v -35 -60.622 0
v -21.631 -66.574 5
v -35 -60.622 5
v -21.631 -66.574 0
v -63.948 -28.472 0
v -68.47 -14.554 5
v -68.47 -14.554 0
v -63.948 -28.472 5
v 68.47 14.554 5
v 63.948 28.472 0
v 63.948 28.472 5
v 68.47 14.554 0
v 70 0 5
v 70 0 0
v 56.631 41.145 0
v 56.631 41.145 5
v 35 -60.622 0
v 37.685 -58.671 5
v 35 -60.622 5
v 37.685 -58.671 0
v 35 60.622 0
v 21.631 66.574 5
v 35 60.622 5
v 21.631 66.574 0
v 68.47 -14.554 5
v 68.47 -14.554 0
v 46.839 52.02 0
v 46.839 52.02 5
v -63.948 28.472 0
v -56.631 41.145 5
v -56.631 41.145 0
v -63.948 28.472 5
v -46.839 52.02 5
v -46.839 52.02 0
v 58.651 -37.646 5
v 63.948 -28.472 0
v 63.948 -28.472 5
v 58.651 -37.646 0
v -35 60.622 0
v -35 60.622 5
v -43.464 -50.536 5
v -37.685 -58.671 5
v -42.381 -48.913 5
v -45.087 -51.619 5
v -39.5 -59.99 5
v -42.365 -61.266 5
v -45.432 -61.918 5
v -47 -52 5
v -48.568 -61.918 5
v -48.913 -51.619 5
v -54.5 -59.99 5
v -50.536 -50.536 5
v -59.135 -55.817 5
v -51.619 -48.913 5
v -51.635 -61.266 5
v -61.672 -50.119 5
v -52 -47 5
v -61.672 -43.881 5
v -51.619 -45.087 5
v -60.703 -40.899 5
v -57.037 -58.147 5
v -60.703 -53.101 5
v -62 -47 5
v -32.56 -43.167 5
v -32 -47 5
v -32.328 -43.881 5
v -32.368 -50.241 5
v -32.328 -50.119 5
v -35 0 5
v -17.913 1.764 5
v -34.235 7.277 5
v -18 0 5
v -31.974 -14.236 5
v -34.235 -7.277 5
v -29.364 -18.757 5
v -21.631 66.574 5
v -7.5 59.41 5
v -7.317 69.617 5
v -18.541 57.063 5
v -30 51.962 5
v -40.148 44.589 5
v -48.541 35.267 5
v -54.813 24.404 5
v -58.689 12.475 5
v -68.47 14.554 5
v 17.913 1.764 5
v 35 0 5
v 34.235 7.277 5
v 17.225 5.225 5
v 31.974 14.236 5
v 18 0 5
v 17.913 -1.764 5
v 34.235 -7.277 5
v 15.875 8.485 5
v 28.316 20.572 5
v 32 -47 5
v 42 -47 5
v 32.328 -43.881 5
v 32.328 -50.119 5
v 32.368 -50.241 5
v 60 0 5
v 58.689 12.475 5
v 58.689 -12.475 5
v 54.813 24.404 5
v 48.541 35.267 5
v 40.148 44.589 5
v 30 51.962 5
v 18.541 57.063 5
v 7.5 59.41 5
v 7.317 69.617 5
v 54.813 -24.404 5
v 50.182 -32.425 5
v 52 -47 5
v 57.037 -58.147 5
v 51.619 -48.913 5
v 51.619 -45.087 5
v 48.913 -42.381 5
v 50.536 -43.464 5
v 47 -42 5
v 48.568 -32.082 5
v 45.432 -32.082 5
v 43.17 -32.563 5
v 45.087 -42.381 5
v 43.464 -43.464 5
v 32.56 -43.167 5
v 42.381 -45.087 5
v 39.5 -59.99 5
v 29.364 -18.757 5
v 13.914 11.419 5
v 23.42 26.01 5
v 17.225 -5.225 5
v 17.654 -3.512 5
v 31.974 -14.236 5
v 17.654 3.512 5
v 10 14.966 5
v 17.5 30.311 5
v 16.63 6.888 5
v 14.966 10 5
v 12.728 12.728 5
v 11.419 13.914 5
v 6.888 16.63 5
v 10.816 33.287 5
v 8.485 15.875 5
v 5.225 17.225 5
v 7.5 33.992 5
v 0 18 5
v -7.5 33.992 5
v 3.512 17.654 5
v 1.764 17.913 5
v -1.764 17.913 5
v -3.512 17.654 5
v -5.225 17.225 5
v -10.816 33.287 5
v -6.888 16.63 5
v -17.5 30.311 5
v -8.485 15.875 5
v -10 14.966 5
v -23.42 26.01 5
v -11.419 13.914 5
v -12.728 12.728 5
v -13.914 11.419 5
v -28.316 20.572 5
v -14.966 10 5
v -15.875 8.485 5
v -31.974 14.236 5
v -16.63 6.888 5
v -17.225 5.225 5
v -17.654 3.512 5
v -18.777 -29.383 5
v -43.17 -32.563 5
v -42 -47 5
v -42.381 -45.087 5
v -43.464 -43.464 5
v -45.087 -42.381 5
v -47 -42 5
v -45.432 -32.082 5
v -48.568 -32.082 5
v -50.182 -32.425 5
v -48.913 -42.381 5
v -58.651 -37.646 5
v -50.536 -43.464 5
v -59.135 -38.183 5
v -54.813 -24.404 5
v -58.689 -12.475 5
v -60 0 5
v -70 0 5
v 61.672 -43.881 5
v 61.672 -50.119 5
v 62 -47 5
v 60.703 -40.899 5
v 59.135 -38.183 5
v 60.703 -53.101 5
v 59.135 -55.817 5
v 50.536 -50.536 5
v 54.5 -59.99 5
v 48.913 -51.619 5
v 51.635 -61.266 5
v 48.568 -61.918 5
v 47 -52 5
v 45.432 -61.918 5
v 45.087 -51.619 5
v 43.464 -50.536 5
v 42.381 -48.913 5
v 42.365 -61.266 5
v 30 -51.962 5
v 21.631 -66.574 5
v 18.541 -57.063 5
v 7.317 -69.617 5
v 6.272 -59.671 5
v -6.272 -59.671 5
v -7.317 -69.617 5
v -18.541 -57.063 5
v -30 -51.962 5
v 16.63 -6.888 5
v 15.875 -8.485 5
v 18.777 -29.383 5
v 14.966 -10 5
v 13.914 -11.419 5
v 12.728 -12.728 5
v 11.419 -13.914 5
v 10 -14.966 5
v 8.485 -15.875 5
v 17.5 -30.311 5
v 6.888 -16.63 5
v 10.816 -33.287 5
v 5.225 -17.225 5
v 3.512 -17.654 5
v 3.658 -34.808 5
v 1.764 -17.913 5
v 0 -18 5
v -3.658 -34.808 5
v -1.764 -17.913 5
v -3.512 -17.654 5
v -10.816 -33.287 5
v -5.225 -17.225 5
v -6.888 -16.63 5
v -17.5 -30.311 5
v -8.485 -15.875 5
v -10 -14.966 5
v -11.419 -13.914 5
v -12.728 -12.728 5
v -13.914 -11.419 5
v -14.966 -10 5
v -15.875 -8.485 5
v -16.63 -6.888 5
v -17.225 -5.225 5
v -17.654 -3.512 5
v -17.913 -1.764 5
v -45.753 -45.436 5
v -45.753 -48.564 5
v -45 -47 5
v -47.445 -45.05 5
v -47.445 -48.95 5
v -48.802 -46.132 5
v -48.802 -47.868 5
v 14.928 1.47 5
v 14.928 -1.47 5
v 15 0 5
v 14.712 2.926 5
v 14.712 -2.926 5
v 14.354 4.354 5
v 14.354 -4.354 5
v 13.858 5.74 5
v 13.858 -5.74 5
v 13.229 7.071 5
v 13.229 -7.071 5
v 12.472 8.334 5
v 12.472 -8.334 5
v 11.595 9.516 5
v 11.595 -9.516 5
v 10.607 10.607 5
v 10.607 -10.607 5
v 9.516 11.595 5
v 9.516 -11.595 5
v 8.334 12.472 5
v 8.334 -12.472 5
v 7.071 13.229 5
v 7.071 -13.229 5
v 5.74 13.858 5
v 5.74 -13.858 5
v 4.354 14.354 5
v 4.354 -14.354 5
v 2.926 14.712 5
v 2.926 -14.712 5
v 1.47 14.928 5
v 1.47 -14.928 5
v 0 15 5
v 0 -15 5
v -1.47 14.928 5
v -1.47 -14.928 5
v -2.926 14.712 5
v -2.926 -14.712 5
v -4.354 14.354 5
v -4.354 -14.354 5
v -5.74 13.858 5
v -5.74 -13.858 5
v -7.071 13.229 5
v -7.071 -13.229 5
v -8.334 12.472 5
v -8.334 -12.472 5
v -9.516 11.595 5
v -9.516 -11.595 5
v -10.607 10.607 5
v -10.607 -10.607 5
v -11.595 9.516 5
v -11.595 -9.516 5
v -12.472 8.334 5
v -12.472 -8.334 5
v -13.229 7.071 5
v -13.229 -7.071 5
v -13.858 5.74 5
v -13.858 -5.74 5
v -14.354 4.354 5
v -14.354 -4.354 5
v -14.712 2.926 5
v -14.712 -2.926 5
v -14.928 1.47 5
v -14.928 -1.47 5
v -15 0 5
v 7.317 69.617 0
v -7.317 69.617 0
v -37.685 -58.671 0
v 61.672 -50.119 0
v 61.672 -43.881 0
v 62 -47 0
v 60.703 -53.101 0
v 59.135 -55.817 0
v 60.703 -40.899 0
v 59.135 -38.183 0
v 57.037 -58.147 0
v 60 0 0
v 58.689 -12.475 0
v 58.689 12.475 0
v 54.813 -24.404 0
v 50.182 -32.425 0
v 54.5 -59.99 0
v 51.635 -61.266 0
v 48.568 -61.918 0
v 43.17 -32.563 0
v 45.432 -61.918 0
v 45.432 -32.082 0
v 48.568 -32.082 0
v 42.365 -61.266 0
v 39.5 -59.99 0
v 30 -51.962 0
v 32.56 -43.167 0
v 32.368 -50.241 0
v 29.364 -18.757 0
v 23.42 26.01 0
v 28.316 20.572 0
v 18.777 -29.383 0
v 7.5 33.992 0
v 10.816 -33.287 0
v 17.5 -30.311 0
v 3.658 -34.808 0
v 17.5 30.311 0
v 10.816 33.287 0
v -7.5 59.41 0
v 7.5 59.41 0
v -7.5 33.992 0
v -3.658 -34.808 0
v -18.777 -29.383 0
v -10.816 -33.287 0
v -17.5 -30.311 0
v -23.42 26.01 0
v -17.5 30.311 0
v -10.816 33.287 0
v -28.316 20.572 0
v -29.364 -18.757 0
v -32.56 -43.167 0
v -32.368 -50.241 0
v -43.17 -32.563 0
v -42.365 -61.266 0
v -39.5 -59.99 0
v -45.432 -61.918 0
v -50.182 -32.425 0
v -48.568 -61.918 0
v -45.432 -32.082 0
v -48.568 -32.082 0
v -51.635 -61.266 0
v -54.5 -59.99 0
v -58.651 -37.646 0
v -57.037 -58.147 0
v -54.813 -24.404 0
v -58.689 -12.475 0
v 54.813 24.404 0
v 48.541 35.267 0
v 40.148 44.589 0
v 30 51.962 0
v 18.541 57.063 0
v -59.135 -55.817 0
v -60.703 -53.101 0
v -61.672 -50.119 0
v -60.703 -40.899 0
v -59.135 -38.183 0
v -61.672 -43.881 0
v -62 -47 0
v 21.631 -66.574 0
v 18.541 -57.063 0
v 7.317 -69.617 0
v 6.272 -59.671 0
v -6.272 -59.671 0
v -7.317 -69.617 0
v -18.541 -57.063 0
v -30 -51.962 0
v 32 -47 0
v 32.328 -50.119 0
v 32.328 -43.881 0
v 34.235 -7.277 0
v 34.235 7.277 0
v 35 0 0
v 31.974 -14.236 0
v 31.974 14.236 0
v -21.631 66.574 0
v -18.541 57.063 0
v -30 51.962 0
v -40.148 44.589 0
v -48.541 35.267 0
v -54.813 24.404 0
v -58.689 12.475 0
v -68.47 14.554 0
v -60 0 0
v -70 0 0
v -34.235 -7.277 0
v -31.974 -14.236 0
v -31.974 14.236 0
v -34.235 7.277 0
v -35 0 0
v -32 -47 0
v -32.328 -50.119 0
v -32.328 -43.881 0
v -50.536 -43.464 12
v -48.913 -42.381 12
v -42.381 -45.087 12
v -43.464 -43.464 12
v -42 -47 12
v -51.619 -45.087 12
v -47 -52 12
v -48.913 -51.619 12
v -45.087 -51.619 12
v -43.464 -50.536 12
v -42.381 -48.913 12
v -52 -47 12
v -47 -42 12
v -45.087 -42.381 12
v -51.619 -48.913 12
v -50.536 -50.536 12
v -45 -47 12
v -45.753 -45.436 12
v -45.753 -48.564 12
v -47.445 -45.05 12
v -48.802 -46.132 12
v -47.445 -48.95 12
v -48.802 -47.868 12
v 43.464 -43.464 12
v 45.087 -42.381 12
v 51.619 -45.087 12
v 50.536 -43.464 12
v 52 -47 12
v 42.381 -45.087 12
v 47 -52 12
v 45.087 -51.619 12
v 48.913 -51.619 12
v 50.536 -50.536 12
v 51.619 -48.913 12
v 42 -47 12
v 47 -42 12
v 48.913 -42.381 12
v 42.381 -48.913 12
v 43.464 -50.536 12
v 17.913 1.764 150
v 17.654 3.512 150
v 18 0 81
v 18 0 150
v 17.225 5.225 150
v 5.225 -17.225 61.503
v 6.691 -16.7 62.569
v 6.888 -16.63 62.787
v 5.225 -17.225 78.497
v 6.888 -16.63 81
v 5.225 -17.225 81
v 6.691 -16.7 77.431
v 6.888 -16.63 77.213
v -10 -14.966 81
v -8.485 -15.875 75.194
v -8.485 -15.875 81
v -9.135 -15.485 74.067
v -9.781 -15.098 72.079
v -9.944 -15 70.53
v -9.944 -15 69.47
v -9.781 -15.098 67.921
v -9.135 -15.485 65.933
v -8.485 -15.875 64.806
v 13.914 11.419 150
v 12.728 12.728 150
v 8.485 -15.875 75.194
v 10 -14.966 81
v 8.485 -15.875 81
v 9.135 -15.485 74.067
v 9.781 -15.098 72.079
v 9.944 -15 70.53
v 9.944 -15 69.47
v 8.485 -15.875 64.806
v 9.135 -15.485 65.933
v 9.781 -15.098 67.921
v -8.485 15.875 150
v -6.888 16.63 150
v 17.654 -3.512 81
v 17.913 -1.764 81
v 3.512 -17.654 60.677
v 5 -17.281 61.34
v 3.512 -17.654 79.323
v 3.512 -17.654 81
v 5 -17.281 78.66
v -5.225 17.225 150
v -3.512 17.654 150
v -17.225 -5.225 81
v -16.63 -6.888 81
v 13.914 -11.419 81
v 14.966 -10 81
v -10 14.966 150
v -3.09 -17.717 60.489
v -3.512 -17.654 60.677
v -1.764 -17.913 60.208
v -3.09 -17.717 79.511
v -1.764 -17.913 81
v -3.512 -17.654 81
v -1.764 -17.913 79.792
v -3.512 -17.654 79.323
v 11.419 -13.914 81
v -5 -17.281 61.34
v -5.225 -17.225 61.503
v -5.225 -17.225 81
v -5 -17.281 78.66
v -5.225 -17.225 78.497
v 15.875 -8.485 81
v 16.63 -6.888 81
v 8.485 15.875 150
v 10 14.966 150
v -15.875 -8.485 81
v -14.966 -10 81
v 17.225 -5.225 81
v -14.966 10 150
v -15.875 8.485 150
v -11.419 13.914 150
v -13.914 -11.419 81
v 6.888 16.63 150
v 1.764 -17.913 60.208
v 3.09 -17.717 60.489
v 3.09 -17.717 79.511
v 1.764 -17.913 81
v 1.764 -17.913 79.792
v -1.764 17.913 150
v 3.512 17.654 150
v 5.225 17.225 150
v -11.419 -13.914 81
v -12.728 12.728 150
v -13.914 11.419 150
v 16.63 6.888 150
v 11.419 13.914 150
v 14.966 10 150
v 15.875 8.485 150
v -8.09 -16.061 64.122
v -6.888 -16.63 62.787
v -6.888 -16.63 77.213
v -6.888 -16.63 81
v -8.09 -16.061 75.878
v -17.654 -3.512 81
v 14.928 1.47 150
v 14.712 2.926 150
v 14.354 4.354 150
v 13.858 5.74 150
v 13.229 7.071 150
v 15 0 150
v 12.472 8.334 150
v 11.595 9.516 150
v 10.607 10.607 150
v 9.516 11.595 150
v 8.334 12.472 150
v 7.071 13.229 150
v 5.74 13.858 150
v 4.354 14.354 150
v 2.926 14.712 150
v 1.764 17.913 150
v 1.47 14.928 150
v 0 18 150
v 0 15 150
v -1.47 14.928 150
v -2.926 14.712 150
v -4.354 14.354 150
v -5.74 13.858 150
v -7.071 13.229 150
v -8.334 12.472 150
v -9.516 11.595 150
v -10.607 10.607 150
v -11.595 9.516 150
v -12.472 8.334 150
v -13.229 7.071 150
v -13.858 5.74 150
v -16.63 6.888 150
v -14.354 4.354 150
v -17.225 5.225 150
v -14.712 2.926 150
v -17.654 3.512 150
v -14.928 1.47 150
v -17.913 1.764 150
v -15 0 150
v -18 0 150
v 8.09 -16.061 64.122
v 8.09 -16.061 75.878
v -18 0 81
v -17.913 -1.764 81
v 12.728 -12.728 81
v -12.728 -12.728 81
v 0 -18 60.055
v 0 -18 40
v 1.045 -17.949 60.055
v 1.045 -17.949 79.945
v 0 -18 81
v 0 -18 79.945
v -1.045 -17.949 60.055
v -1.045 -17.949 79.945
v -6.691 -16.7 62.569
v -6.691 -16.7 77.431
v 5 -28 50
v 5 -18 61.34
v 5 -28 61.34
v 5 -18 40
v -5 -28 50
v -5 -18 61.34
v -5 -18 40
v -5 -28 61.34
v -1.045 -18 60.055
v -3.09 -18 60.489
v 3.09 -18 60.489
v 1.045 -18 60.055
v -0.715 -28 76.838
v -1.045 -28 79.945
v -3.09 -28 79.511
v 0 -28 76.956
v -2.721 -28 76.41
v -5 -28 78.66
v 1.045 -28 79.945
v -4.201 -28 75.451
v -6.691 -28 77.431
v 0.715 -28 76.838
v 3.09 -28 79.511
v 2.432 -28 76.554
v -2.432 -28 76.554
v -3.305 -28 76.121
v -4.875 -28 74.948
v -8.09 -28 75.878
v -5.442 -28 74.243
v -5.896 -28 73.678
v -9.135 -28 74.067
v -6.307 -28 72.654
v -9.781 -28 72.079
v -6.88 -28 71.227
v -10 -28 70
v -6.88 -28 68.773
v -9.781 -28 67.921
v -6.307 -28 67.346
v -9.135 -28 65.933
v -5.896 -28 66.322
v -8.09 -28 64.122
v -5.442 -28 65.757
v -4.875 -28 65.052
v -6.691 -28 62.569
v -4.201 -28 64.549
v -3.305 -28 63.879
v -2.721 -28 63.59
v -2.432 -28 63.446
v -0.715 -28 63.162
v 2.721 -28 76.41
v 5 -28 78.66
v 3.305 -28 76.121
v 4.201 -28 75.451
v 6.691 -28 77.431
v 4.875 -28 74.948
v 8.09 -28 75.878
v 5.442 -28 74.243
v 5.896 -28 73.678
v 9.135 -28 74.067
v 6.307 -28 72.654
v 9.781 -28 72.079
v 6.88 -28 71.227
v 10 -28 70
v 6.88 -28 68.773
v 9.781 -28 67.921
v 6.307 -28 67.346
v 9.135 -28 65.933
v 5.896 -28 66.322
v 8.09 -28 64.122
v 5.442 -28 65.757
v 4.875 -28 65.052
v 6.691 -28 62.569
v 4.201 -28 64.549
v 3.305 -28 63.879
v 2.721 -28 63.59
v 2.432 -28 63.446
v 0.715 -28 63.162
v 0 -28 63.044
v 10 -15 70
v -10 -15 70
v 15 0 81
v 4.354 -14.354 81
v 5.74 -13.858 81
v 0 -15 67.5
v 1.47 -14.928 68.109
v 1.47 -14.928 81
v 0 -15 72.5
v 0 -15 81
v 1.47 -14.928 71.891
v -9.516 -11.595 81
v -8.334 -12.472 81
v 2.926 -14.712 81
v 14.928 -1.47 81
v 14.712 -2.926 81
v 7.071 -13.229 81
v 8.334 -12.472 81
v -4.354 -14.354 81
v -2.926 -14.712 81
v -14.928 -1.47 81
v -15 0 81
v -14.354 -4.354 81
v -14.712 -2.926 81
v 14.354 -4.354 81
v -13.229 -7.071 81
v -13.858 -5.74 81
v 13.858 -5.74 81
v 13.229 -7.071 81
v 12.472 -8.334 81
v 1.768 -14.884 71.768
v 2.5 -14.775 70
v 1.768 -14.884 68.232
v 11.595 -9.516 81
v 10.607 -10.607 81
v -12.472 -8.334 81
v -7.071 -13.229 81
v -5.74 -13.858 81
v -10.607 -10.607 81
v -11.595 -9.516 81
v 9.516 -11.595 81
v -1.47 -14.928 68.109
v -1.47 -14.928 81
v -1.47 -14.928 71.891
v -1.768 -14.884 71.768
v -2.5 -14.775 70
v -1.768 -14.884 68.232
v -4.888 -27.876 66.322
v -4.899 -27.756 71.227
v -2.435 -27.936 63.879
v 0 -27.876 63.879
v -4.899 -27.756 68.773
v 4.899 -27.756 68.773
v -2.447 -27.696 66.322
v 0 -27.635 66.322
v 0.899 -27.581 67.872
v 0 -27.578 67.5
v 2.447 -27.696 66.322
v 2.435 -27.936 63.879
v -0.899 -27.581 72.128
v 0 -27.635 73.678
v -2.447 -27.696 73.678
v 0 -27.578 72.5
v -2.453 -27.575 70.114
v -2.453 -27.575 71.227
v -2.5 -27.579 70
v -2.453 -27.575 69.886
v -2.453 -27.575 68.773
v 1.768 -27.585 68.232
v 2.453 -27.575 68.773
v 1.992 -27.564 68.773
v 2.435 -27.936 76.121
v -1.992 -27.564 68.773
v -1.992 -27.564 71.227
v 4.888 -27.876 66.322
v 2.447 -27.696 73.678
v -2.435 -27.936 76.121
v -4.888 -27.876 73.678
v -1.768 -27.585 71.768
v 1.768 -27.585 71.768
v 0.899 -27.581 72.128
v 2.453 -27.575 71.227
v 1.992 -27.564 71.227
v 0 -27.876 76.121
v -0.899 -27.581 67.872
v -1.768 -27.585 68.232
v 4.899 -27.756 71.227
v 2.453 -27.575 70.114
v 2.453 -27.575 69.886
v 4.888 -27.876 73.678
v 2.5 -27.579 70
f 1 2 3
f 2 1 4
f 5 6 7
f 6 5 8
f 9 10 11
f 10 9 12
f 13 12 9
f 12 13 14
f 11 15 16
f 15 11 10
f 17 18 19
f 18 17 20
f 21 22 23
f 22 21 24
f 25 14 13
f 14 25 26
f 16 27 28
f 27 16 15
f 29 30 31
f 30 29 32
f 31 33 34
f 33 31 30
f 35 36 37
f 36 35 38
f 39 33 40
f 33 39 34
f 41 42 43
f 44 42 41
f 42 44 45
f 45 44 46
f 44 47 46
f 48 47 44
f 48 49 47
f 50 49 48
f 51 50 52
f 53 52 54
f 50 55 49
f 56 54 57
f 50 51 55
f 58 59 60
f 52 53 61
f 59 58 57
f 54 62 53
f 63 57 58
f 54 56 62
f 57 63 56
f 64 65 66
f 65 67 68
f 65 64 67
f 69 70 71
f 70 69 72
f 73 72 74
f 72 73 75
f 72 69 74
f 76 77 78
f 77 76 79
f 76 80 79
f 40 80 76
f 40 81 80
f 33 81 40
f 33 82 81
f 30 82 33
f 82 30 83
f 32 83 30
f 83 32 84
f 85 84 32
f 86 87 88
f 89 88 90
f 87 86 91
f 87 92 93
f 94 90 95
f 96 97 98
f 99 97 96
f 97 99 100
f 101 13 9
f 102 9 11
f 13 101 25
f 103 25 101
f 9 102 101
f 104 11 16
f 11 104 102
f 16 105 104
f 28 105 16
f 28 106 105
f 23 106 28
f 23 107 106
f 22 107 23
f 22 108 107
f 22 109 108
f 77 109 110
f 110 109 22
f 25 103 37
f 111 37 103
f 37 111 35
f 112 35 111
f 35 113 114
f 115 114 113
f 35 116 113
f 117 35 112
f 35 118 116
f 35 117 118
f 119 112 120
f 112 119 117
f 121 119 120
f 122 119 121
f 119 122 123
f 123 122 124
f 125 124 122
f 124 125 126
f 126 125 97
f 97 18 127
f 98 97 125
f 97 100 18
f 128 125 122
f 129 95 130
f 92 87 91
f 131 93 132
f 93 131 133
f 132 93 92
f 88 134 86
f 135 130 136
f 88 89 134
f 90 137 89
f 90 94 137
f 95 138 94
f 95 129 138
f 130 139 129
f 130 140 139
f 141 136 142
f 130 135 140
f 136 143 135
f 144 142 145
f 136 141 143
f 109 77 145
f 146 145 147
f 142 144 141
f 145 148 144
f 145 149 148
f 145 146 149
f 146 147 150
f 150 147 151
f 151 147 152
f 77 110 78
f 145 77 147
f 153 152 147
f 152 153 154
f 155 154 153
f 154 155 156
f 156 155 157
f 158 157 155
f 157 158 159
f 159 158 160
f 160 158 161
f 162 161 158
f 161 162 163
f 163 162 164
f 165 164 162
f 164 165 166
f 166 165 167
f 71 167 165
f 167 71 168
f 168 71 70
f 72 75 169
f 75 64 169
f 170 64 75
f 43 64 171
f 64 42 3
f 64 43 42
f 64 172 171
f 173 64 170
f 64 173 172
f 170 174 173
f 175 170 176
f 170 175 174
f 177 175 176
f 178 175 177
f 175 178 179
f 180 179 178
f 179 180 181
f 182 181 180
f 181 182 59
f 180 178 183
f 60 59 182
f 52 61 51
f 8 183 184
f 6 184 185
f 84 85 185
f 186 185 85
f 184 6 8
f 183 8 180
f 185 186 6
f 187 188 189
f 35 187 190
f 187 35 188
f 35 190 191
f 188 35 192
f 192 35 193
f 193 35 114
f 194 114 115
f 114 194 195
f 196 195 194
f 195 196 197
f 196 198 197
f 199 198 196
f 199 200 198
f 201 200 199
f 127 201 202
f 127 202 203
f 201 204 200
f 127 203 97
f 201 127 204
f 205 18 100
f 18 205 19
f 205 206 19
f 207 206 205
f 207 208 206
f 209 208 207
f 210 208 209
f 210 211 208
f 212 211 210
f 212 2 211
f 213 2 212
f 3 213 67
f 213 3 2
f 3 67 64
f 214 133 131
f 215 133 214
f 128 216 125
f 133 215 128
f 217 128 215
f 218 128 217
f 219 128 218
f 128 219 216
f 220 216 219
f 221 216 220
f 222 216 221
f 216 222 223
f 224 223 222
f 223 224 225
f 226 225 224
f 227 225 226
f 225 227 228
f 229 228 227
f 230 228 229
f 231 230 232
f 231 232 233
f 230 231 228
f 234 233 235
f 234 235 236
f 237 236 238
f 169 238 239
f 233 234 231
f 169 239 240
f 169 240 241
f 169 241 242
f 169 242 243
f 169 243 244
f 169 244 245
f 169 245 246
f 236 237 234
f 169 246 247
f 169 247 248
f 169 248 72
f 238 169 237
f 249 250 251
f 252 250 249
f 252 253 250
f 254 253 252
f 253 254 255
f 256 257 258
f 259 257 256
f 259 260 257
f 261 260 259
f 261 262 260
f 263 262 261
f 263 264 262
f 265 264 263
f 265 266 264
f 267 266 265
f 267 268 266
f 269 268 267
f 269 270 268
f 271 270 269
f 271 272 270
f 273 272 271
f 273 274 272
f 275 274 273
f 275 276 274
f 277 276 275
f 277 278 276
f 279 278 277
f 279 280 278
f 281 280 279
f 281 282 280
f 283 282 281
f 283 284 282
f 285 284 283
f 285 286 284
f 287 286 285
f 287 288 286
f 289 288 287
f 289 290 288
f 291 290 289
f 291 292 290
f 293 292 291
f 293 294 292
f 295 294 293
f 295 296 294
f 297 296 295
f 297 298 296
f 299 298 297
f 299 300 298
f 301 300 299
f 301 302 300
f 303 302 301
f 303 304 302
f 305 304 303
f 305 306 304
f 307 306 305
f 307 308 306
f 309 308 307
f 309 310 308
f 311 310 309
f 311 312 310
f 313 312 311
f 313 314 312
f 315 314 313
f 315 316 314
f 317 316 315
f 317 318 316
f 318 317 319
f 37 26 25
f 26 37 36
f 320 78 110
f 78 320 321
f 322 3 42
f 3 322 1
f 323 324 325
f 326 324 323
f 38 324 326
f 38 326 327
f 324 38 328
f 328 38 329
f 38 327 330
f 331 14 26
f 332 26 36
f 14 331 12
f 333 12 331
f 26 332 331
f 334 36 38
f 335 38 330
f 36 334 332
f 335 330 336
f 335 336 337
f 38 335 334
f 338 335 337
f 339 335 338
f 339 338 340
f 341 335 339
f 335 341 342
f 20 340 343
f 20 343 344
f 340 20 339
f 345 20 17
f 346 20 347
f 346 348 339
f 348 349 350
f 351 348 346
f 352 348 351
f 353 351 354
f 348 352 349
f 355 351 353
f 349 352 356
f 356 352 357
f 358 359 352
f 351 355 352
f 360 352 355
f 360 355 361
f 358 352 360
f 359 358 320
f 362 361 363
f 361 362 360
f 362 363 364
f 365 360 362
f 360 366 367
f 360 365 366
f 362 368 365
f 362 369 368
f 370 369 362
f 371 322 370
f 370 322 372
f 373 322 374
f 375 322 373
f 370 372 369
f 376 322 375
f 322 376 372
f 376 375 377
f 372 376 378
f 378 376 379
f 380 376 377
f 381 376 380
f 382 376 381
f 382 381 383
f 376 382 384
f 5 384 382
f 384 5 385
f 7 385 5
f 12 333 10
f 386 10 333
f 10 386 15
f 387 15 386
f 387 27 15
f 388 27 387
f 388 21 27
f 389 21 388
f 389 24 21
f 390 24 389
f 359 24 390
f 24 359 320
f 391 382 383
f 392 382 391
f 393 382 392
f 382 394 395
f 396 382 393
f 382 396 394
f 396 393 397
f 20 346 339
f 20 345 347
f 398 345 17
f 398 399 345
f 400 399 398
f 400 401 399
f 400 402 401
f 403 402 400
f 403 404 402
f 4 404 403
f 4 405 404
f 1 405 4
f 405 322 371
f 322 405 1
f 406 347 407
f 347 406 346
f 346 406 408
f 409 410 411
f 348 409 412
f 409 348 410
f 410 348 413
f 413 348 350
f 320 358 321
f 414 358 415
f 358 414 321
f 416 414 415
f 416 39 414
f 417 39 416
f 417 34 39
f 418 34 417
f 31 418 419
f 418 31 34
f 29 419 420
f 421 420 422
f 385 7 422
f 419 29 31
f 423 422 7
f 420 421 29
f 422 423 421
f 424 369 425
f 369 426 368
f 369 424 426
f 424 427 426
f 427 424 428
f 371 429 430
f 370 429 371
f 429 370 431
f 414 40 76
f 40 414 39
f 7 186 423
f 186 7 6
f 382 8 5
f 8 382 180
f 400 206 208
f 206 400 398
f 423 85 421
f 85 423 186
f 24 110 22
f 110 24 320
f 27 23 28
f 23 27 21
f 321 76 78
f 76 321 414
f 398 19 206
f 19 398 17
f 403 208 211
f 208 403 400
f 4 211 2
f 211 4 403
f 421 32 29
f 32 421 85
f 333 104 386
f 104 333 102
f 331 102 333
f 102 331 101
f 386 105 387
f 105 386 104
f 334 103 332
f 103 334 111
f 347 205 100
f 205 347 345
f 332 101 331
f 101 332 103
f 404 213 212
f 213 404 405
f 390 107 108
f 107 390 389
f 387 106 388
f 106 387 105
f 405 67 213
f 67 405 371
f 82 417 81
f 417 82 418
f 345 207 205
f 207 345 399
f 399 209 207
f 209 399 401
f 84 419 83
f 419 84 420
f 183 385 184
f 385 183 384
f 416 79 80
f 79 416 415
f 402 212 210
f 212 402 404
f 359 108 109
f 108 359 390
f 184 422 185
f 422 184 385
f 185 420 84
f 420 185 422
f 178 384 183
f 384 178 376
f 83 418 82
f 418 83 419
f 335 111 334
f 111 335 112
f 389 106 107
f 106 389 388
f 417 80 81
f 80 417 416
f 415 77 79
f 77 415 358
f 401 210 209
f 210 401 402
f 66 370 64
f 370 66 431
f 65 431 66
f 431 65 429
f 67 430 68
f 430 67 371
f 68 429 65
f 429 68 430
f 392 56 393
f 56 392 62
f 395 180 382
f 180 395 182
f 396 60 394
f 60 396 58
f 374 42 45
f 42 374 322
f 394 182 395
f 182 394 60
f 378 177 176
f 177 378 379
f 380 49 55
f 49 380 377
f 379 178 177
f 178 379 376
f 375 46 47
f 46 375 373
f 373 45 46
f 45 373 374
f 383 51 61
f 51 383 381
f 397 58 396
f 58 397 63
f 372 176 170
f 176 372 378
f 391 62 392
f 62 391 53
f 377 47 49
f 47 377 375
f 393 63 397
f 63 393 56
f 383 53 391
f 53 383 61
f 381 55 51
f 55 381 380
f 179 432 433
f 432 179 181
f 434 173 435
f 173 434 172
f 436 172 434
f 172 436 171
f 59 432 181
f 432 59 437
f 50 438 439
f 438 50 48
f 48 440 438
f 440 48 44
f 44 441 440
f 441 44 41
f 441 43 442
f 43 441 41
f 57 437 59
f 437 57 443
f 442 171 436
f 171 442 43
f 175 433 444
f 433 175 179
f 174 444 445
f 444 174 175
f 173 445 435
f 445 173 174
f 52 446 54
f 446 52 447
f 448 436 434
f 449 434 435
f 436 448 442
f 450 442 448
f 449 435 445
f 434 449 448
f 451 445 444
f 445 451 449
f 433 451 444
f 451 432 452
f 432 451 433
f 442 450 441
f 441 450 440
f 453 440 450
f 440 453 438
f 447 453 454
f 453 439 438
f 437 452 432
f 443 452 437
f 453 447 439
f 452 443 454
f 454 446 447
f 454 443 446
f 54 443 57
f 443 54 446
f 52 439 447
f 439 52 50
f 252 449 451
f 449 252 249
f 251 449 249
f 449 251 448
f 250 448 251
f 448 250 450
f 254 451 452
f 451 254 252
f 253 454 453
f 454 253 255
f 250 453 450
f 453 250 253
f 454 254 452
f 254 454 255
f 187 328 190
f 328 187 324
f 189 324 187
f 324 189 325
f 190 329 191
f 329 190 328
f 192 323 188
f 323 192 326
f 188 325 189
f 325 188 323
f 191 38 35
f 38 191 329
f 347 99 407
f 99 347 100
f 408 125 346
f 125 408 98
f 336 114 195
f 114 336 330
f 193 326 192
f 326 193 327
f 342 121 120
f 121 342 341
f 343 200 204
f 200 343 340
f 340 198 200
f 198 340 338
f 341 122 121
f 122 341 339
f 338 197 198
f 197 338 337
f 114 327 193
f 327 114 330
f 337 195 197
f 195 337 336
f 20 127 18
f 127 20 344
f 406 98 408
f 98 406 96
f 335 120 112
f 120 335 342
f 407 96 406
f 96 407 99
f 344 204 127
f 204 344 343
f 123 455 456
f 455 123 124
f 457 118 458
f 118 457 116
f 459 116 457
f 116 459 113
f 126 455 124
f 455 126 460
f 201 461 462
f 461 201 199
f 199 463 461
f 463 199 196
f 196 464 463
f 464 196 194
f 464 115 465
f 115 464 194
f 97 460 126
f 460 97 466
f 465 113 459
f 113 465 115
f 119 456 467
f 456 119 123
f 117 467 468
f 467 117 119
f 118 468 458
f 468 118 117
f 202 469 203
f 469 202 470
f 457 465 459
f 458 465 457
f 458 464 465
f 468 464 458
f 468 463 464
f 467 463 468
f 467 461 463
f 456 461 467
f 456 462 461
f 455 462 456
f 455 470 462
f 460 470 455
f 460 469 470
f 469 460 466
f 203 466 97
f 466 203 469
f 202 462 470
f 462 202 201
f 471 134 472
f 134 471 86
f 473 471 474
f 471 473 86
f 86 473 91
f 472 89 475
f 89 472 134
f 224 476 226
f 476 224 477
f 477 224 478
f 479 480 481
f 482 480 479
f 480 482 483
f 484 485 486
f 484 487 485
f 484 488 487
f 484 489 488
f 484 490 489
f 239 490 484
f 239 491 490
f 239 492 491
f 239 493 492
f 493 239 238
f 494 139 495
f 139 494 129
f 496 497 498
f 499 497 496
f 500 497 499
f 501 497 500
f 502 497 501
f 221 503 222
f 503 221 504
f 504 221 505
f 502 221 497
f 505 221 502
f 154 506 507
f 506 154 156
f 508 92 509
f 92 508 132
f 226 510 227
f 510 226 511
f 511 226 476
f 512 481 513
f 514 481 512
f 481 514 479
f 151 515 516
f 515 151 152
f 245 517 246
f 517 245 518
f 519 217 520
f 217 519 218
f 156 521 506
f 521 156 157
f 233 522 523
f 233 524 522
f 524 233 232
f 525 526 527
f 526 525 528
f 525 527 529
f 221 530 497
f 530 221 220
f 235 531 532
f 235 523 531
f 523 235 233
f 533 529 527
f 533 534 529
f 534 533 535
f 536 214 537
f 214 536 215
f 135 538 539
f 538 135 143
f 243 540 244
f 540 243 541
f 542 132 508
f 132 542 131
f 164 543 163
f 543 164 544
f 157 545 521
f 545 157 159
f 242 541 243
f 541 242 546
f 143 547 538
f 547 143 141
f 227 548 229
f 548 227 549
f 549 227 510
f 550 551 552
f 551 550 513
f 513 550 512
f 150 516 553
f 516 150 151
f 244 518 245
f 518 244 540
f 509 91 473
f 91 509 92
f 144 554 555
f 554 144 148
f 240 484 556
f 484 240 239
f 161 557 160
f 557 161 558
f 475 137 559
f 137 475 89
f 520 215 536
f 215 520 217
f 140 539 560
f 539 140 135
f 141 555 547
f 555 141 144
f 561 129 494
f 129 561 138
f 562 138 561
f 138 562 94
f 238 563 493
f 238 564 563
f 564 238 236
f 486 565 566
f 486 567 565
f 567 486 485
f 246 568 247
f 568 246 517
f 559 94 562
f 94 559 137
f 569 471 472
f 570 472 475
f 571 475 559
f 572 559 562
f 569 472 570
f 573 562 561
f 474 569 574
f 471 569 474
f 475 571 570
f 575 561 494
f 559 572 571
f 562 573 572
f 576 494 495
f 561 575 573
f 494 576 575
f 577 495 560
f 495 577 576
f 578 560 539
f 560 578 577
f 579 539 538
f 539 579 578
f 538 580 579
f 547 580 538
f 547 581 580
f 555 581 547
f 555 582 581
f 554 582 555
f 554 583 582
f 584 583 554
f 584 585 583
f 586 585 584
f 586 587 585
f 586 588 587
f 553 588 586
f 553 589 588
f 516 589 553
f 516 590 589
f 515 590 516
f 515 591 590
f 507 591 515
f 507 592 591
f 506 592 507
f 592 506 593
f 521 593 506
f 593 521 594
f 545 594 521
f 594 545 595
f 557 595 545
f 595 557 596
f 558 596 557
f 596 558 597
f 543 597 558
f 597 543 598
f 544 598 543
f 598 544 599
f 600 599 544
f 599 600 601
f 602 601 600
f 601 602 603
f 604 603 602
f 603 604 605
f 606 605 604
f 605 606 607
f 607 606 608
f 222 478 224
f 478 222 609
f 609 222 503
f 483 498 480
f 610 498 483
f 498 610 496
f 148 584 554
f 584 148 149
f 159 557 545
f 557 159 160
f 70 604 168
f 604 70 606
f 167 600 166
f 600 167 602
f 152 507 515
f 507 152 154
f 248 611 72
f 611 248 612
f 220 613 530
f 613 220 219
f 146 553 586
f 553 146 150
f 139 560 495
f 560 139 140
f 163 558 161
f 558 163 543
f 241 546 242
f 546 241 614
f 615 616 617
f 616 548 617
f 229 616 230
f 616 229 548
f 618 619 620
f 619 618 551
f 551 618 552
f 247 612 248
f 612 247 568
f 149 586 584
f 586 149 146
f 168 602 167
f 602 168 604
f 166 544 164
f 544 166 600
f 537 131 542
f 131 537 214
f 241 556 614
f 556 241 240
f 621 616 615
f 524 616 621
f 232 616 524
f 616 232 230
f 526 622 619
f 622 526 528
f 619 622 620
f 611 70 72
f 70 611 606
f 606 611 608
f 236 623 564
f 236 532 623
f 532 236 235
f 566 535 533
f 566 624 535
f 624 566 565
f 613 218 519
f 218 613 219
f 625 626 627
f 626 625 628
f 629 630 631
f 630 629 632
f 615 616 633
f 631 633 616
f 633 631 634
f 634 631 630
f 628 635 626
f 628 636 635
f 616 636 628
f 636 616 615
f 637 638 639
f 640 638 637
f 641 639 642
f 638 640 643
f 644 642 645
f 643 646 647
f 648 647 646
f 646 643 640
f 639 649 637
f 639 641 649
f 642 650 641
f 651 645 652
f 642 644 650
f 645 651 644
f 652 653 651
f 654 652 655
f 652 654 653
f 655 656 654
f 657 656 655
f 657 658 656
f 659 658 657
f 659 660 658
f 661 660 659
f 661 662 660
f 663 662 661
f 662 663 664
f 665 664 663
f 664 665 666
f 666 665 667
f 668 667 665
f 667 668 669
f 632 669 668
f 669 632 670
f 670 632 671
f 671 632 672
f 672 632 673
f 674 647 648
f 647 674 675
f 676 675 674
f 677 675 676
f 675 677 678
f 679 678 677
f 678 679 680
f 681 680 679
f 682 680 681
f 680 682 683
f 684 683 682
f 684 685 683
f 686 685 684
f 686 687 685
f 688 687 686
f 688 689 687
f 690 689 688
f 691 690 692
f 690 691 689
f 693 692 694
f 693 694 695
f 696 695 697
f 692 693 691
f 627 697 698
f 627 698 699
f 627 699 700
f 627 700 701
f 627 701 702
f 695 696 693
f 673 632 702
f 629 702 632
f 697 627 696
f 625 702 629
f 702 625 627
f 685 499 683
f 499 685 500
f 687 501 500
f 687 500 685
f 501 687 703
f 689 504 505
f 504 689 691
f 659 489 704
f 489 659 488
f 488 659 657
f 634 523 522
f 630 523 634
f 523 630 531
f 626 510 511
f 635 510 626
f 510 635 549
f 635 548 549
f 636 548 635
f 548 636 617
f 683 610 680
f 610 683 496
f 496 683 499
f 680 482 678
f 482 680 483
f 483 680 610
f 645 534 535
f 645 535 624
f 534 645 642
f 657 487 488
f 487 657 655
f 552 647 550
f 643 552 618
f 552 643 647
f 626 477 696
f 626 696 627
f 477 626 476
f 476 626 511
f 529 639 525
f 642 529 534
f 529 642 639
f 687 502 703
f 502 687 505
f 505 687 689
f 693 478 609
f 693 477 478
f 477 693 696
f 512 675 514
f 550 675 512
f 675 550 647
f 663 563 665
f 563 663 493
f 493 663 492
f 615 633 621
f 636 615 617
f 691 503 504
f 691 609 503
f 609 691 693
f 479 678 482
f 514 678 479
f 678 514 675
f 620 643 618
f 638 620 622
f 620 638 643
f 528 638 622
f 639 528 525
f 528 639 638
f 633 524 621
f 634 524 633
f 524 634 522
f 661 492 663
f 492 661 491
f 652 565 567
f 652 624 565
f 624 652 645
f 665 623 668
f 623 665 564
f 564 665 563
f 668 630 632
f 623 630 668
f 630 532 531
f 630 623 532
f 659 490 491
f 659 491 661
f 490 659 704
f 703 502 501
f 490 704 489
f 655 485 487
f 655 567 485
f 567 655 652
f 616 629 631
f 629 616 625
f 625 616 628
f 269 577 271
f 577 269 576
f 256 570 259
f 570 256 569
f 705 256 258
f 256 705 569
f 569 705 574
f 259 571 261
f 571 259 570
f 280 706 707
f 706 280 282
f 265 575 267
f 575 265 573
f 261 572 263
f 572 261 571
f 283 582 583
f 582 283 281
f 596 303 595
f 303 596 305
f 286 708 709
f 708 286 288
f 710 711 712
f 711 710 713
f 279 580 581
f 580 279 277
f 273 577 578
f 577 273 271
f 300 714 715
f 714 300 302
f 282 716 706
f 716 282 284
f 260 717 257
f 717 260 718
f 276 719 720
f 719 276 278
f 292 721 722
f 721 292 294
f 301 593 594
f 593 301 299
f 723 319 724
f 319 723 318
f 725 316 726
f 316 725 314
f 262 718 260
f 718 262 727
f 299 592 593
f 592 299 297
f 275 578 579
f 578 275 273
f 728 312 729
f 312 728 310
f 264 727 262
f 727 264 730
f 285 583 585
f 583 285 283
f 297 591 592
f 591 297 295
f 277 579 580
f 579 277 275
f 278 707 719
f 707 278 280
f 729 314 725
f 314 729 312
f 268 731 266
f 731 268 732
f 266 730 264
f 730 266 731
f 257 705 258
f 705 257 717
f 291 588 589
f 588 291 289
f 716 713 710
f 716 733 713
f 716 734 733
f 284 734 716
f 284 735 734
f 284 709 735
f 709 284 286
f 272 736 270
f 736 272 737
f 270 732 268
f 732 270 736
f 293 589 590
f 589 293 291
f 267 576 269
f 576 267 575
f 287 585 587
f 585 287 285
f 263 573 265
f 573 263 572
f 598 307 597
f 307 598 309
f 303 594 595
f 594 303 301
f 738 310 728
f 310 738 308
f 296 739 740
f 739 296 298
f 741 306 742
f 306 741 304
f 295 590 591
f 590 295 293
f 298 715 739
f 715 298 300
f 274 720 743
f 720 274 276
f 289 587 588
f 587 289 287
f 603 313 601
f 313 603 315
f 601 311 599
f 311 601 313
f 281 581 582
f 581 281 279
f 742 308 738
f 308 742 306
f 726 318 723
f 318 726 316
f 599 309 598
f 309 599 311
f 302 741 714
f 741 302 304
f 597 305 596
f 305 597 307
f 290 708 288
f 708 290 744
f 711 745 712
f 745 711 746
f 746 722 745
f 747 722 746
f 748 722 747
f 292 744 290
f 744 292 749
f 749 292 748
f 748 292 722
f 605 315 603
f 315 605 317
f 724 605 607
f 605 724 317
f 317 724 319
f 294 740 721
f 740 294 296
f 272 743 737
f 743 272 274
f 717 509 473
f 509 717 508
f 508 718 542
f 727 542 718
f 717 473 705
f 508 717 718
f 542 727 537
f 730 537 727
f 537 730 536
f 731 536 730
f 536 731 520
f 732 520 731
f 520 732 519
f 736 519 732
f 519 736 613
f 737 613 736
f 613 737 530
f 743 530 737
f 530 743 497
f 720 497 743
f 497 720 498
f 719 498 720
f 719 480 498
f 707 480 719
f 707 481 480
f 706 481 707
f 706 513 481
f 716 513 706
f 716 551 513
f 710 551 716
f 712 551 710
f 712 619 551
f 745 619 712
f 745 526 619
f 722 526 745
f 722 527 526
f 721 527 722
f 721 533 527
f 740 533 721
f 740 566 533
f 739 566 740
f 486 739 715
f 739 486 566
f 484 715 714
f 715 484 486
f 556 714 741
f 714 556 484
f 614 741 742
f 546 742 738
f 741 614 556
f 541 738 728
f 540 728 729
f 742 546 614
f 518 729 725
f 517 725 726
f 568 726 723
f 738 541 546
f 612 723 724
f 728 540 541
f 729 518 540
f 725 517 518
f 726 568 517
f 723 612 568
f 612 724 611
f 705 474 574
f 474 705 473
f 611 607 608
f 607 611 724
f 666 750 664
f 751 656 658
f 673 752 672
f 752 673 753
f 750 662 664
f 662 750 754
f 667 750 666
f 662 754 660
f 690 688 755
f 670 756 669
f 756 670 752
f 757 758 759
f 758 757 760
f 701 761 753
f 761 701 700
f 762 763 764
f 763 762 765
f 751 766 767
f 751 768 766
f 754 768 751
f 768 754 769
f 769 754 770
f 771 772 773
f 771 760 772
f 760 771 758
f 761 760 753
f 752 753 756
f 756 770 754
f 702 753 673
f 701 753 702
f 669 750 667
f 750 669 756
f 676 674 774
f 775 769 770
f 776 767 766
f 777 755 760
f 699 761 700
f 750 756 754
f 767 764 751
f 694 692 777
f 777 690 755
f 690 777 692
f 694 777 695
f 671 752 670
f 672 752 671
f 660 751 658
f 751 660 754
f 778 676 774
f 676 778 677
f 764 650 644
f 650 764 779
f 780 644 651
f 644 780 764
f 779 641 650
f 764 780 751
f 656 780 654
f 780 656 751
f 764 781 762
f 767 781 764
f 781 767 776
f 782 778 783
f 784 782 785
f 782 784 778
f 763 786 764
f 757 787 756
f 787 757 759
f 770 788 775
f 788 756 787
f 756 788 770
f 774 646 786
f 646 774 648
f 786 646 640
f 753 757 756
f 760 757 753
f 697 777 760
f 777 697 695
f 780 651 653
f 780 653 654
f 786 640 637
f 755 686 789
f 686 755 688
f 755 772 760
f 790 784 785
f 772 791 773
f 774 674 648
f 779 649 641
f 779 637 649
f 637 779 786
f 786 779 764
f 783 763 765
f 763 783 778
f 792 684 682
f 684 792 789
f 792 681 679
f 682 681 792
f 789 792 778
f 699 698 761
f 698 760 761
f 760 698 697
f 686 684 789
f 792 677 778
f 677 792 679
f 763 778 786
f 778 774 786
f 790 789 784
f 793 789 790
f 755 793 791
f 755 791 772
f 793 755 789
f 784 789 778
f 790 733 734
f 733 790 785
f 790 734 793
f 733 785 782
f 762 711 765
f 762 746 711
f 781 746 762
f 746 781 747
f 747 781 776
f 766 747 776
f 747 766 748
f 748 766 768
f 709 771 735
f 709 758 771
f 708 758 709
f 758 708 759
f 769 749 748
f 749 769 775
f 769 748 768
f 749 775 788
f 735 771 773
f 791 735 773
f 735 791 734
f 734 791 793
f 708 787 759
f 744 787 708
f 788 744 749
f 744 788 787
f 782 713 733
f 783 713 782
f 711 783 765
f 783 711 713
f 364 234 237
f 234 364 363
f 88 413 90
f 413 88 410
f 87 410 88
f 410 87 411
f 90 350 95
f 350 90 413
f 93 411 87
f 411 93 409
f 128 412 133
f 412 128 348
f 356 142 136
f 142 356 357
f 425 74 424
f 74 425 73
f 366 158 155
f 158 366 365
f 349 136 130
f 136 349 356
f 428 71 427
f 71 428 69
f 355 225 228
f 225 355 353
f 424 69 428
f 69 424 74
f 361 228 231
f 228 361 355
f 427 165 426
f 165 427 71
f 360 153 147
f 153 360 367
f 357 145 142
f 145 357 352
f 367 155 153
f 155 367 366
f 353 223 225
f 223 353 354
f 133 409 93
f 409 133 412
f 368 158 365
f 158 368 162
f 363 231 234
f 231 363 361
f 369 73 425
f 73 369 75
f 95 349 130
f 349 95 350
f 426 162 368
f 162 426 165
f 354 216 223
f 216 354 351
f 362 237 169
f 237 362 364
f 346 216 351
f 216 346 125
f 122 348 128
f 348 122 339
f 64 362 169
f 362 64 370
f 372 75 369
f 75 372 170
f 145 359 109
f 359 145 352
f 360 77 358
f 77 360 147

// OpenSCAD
cylinder(h=5, d=70);

difference() {
    cylinder(h=5, d=140);
    translate([0, 0, -1]) cylinder(h=7, d=120);
}


 translate([30, -30, 2.5]) rotate([0, 0, 45]) cube([15, 60, 5], center=true);
 translate([-30, -30, 2.5]) rotate([0, 0, 135]) cube([15, 60, 5], center=true); 
translate([0, 30, 2.5]) rotate([0, 0, 0]) cube([15, 75, 5], center=true);


translate([-47, -47, 0]) {
    difference() {
        union() {
            cylinder(h=5, d=30);
            cylinder(h=12, d=10);
        }
        translate([0, 0, -1]) cylinder(h=14, d=4);
    }
    
}

translate([47, -47, 0]) {
    cylinder(h=5, d=30);
    cylinder(h=12, d=10);
}


// pipe
    
pipe_length     = 150;
pipe_diameter   = 36;
cutout_length   = 70;

translate([0, 0, 0]) rotate([0, 0, 0]) {
    
    difference() {
        union() {
            cylinder(h=pipe_length, d=pipe_diameter, $fn=64);
            
            translate([-10/2, -(pipe_diameter/2 + 10), 50]) cube([10, 10, 25]);         
            translate([0, -(pipe_diameter/2)+3, 70]) rotate([90, 0, 0]) cylinder(h=13, d=20);
            translate([5, -10-pipe_diameter/2, 50]) rotate([0, 180, 0]) prism(10, 10, 10);
        }
        translate([0, 0, -1]) cylinder(h=pipe_length+2, d=pipe_diameter-6, $fn=64);
        translate([-pipe_diameter/2, -pipe_diameter, pipe_length-cutout_length+1]) cube([ pipe_diameter, pipe_diameter, cutout_length+1]);
        
        // pen screw nudge
        translate([0, -77.5, 70]) sphere(d=100, $fn=128);
        
        // pen screw hole
        translate([0, 0, 70]) rotate([90, 0, 0])cylinder(h=30, d=5);
    }
}

// -------------------------------------------------------------

module prism(l, w, h){
    polyhedron(points=[[0,0,0], [l,0,0], [l,w,0], [0,w,0], [0,w,h], [l,w,h]], faces=[[0,1,2,3],[5,4,3,2],[0,4,5,1],[0,3,4],[5,2,1]]);
}
